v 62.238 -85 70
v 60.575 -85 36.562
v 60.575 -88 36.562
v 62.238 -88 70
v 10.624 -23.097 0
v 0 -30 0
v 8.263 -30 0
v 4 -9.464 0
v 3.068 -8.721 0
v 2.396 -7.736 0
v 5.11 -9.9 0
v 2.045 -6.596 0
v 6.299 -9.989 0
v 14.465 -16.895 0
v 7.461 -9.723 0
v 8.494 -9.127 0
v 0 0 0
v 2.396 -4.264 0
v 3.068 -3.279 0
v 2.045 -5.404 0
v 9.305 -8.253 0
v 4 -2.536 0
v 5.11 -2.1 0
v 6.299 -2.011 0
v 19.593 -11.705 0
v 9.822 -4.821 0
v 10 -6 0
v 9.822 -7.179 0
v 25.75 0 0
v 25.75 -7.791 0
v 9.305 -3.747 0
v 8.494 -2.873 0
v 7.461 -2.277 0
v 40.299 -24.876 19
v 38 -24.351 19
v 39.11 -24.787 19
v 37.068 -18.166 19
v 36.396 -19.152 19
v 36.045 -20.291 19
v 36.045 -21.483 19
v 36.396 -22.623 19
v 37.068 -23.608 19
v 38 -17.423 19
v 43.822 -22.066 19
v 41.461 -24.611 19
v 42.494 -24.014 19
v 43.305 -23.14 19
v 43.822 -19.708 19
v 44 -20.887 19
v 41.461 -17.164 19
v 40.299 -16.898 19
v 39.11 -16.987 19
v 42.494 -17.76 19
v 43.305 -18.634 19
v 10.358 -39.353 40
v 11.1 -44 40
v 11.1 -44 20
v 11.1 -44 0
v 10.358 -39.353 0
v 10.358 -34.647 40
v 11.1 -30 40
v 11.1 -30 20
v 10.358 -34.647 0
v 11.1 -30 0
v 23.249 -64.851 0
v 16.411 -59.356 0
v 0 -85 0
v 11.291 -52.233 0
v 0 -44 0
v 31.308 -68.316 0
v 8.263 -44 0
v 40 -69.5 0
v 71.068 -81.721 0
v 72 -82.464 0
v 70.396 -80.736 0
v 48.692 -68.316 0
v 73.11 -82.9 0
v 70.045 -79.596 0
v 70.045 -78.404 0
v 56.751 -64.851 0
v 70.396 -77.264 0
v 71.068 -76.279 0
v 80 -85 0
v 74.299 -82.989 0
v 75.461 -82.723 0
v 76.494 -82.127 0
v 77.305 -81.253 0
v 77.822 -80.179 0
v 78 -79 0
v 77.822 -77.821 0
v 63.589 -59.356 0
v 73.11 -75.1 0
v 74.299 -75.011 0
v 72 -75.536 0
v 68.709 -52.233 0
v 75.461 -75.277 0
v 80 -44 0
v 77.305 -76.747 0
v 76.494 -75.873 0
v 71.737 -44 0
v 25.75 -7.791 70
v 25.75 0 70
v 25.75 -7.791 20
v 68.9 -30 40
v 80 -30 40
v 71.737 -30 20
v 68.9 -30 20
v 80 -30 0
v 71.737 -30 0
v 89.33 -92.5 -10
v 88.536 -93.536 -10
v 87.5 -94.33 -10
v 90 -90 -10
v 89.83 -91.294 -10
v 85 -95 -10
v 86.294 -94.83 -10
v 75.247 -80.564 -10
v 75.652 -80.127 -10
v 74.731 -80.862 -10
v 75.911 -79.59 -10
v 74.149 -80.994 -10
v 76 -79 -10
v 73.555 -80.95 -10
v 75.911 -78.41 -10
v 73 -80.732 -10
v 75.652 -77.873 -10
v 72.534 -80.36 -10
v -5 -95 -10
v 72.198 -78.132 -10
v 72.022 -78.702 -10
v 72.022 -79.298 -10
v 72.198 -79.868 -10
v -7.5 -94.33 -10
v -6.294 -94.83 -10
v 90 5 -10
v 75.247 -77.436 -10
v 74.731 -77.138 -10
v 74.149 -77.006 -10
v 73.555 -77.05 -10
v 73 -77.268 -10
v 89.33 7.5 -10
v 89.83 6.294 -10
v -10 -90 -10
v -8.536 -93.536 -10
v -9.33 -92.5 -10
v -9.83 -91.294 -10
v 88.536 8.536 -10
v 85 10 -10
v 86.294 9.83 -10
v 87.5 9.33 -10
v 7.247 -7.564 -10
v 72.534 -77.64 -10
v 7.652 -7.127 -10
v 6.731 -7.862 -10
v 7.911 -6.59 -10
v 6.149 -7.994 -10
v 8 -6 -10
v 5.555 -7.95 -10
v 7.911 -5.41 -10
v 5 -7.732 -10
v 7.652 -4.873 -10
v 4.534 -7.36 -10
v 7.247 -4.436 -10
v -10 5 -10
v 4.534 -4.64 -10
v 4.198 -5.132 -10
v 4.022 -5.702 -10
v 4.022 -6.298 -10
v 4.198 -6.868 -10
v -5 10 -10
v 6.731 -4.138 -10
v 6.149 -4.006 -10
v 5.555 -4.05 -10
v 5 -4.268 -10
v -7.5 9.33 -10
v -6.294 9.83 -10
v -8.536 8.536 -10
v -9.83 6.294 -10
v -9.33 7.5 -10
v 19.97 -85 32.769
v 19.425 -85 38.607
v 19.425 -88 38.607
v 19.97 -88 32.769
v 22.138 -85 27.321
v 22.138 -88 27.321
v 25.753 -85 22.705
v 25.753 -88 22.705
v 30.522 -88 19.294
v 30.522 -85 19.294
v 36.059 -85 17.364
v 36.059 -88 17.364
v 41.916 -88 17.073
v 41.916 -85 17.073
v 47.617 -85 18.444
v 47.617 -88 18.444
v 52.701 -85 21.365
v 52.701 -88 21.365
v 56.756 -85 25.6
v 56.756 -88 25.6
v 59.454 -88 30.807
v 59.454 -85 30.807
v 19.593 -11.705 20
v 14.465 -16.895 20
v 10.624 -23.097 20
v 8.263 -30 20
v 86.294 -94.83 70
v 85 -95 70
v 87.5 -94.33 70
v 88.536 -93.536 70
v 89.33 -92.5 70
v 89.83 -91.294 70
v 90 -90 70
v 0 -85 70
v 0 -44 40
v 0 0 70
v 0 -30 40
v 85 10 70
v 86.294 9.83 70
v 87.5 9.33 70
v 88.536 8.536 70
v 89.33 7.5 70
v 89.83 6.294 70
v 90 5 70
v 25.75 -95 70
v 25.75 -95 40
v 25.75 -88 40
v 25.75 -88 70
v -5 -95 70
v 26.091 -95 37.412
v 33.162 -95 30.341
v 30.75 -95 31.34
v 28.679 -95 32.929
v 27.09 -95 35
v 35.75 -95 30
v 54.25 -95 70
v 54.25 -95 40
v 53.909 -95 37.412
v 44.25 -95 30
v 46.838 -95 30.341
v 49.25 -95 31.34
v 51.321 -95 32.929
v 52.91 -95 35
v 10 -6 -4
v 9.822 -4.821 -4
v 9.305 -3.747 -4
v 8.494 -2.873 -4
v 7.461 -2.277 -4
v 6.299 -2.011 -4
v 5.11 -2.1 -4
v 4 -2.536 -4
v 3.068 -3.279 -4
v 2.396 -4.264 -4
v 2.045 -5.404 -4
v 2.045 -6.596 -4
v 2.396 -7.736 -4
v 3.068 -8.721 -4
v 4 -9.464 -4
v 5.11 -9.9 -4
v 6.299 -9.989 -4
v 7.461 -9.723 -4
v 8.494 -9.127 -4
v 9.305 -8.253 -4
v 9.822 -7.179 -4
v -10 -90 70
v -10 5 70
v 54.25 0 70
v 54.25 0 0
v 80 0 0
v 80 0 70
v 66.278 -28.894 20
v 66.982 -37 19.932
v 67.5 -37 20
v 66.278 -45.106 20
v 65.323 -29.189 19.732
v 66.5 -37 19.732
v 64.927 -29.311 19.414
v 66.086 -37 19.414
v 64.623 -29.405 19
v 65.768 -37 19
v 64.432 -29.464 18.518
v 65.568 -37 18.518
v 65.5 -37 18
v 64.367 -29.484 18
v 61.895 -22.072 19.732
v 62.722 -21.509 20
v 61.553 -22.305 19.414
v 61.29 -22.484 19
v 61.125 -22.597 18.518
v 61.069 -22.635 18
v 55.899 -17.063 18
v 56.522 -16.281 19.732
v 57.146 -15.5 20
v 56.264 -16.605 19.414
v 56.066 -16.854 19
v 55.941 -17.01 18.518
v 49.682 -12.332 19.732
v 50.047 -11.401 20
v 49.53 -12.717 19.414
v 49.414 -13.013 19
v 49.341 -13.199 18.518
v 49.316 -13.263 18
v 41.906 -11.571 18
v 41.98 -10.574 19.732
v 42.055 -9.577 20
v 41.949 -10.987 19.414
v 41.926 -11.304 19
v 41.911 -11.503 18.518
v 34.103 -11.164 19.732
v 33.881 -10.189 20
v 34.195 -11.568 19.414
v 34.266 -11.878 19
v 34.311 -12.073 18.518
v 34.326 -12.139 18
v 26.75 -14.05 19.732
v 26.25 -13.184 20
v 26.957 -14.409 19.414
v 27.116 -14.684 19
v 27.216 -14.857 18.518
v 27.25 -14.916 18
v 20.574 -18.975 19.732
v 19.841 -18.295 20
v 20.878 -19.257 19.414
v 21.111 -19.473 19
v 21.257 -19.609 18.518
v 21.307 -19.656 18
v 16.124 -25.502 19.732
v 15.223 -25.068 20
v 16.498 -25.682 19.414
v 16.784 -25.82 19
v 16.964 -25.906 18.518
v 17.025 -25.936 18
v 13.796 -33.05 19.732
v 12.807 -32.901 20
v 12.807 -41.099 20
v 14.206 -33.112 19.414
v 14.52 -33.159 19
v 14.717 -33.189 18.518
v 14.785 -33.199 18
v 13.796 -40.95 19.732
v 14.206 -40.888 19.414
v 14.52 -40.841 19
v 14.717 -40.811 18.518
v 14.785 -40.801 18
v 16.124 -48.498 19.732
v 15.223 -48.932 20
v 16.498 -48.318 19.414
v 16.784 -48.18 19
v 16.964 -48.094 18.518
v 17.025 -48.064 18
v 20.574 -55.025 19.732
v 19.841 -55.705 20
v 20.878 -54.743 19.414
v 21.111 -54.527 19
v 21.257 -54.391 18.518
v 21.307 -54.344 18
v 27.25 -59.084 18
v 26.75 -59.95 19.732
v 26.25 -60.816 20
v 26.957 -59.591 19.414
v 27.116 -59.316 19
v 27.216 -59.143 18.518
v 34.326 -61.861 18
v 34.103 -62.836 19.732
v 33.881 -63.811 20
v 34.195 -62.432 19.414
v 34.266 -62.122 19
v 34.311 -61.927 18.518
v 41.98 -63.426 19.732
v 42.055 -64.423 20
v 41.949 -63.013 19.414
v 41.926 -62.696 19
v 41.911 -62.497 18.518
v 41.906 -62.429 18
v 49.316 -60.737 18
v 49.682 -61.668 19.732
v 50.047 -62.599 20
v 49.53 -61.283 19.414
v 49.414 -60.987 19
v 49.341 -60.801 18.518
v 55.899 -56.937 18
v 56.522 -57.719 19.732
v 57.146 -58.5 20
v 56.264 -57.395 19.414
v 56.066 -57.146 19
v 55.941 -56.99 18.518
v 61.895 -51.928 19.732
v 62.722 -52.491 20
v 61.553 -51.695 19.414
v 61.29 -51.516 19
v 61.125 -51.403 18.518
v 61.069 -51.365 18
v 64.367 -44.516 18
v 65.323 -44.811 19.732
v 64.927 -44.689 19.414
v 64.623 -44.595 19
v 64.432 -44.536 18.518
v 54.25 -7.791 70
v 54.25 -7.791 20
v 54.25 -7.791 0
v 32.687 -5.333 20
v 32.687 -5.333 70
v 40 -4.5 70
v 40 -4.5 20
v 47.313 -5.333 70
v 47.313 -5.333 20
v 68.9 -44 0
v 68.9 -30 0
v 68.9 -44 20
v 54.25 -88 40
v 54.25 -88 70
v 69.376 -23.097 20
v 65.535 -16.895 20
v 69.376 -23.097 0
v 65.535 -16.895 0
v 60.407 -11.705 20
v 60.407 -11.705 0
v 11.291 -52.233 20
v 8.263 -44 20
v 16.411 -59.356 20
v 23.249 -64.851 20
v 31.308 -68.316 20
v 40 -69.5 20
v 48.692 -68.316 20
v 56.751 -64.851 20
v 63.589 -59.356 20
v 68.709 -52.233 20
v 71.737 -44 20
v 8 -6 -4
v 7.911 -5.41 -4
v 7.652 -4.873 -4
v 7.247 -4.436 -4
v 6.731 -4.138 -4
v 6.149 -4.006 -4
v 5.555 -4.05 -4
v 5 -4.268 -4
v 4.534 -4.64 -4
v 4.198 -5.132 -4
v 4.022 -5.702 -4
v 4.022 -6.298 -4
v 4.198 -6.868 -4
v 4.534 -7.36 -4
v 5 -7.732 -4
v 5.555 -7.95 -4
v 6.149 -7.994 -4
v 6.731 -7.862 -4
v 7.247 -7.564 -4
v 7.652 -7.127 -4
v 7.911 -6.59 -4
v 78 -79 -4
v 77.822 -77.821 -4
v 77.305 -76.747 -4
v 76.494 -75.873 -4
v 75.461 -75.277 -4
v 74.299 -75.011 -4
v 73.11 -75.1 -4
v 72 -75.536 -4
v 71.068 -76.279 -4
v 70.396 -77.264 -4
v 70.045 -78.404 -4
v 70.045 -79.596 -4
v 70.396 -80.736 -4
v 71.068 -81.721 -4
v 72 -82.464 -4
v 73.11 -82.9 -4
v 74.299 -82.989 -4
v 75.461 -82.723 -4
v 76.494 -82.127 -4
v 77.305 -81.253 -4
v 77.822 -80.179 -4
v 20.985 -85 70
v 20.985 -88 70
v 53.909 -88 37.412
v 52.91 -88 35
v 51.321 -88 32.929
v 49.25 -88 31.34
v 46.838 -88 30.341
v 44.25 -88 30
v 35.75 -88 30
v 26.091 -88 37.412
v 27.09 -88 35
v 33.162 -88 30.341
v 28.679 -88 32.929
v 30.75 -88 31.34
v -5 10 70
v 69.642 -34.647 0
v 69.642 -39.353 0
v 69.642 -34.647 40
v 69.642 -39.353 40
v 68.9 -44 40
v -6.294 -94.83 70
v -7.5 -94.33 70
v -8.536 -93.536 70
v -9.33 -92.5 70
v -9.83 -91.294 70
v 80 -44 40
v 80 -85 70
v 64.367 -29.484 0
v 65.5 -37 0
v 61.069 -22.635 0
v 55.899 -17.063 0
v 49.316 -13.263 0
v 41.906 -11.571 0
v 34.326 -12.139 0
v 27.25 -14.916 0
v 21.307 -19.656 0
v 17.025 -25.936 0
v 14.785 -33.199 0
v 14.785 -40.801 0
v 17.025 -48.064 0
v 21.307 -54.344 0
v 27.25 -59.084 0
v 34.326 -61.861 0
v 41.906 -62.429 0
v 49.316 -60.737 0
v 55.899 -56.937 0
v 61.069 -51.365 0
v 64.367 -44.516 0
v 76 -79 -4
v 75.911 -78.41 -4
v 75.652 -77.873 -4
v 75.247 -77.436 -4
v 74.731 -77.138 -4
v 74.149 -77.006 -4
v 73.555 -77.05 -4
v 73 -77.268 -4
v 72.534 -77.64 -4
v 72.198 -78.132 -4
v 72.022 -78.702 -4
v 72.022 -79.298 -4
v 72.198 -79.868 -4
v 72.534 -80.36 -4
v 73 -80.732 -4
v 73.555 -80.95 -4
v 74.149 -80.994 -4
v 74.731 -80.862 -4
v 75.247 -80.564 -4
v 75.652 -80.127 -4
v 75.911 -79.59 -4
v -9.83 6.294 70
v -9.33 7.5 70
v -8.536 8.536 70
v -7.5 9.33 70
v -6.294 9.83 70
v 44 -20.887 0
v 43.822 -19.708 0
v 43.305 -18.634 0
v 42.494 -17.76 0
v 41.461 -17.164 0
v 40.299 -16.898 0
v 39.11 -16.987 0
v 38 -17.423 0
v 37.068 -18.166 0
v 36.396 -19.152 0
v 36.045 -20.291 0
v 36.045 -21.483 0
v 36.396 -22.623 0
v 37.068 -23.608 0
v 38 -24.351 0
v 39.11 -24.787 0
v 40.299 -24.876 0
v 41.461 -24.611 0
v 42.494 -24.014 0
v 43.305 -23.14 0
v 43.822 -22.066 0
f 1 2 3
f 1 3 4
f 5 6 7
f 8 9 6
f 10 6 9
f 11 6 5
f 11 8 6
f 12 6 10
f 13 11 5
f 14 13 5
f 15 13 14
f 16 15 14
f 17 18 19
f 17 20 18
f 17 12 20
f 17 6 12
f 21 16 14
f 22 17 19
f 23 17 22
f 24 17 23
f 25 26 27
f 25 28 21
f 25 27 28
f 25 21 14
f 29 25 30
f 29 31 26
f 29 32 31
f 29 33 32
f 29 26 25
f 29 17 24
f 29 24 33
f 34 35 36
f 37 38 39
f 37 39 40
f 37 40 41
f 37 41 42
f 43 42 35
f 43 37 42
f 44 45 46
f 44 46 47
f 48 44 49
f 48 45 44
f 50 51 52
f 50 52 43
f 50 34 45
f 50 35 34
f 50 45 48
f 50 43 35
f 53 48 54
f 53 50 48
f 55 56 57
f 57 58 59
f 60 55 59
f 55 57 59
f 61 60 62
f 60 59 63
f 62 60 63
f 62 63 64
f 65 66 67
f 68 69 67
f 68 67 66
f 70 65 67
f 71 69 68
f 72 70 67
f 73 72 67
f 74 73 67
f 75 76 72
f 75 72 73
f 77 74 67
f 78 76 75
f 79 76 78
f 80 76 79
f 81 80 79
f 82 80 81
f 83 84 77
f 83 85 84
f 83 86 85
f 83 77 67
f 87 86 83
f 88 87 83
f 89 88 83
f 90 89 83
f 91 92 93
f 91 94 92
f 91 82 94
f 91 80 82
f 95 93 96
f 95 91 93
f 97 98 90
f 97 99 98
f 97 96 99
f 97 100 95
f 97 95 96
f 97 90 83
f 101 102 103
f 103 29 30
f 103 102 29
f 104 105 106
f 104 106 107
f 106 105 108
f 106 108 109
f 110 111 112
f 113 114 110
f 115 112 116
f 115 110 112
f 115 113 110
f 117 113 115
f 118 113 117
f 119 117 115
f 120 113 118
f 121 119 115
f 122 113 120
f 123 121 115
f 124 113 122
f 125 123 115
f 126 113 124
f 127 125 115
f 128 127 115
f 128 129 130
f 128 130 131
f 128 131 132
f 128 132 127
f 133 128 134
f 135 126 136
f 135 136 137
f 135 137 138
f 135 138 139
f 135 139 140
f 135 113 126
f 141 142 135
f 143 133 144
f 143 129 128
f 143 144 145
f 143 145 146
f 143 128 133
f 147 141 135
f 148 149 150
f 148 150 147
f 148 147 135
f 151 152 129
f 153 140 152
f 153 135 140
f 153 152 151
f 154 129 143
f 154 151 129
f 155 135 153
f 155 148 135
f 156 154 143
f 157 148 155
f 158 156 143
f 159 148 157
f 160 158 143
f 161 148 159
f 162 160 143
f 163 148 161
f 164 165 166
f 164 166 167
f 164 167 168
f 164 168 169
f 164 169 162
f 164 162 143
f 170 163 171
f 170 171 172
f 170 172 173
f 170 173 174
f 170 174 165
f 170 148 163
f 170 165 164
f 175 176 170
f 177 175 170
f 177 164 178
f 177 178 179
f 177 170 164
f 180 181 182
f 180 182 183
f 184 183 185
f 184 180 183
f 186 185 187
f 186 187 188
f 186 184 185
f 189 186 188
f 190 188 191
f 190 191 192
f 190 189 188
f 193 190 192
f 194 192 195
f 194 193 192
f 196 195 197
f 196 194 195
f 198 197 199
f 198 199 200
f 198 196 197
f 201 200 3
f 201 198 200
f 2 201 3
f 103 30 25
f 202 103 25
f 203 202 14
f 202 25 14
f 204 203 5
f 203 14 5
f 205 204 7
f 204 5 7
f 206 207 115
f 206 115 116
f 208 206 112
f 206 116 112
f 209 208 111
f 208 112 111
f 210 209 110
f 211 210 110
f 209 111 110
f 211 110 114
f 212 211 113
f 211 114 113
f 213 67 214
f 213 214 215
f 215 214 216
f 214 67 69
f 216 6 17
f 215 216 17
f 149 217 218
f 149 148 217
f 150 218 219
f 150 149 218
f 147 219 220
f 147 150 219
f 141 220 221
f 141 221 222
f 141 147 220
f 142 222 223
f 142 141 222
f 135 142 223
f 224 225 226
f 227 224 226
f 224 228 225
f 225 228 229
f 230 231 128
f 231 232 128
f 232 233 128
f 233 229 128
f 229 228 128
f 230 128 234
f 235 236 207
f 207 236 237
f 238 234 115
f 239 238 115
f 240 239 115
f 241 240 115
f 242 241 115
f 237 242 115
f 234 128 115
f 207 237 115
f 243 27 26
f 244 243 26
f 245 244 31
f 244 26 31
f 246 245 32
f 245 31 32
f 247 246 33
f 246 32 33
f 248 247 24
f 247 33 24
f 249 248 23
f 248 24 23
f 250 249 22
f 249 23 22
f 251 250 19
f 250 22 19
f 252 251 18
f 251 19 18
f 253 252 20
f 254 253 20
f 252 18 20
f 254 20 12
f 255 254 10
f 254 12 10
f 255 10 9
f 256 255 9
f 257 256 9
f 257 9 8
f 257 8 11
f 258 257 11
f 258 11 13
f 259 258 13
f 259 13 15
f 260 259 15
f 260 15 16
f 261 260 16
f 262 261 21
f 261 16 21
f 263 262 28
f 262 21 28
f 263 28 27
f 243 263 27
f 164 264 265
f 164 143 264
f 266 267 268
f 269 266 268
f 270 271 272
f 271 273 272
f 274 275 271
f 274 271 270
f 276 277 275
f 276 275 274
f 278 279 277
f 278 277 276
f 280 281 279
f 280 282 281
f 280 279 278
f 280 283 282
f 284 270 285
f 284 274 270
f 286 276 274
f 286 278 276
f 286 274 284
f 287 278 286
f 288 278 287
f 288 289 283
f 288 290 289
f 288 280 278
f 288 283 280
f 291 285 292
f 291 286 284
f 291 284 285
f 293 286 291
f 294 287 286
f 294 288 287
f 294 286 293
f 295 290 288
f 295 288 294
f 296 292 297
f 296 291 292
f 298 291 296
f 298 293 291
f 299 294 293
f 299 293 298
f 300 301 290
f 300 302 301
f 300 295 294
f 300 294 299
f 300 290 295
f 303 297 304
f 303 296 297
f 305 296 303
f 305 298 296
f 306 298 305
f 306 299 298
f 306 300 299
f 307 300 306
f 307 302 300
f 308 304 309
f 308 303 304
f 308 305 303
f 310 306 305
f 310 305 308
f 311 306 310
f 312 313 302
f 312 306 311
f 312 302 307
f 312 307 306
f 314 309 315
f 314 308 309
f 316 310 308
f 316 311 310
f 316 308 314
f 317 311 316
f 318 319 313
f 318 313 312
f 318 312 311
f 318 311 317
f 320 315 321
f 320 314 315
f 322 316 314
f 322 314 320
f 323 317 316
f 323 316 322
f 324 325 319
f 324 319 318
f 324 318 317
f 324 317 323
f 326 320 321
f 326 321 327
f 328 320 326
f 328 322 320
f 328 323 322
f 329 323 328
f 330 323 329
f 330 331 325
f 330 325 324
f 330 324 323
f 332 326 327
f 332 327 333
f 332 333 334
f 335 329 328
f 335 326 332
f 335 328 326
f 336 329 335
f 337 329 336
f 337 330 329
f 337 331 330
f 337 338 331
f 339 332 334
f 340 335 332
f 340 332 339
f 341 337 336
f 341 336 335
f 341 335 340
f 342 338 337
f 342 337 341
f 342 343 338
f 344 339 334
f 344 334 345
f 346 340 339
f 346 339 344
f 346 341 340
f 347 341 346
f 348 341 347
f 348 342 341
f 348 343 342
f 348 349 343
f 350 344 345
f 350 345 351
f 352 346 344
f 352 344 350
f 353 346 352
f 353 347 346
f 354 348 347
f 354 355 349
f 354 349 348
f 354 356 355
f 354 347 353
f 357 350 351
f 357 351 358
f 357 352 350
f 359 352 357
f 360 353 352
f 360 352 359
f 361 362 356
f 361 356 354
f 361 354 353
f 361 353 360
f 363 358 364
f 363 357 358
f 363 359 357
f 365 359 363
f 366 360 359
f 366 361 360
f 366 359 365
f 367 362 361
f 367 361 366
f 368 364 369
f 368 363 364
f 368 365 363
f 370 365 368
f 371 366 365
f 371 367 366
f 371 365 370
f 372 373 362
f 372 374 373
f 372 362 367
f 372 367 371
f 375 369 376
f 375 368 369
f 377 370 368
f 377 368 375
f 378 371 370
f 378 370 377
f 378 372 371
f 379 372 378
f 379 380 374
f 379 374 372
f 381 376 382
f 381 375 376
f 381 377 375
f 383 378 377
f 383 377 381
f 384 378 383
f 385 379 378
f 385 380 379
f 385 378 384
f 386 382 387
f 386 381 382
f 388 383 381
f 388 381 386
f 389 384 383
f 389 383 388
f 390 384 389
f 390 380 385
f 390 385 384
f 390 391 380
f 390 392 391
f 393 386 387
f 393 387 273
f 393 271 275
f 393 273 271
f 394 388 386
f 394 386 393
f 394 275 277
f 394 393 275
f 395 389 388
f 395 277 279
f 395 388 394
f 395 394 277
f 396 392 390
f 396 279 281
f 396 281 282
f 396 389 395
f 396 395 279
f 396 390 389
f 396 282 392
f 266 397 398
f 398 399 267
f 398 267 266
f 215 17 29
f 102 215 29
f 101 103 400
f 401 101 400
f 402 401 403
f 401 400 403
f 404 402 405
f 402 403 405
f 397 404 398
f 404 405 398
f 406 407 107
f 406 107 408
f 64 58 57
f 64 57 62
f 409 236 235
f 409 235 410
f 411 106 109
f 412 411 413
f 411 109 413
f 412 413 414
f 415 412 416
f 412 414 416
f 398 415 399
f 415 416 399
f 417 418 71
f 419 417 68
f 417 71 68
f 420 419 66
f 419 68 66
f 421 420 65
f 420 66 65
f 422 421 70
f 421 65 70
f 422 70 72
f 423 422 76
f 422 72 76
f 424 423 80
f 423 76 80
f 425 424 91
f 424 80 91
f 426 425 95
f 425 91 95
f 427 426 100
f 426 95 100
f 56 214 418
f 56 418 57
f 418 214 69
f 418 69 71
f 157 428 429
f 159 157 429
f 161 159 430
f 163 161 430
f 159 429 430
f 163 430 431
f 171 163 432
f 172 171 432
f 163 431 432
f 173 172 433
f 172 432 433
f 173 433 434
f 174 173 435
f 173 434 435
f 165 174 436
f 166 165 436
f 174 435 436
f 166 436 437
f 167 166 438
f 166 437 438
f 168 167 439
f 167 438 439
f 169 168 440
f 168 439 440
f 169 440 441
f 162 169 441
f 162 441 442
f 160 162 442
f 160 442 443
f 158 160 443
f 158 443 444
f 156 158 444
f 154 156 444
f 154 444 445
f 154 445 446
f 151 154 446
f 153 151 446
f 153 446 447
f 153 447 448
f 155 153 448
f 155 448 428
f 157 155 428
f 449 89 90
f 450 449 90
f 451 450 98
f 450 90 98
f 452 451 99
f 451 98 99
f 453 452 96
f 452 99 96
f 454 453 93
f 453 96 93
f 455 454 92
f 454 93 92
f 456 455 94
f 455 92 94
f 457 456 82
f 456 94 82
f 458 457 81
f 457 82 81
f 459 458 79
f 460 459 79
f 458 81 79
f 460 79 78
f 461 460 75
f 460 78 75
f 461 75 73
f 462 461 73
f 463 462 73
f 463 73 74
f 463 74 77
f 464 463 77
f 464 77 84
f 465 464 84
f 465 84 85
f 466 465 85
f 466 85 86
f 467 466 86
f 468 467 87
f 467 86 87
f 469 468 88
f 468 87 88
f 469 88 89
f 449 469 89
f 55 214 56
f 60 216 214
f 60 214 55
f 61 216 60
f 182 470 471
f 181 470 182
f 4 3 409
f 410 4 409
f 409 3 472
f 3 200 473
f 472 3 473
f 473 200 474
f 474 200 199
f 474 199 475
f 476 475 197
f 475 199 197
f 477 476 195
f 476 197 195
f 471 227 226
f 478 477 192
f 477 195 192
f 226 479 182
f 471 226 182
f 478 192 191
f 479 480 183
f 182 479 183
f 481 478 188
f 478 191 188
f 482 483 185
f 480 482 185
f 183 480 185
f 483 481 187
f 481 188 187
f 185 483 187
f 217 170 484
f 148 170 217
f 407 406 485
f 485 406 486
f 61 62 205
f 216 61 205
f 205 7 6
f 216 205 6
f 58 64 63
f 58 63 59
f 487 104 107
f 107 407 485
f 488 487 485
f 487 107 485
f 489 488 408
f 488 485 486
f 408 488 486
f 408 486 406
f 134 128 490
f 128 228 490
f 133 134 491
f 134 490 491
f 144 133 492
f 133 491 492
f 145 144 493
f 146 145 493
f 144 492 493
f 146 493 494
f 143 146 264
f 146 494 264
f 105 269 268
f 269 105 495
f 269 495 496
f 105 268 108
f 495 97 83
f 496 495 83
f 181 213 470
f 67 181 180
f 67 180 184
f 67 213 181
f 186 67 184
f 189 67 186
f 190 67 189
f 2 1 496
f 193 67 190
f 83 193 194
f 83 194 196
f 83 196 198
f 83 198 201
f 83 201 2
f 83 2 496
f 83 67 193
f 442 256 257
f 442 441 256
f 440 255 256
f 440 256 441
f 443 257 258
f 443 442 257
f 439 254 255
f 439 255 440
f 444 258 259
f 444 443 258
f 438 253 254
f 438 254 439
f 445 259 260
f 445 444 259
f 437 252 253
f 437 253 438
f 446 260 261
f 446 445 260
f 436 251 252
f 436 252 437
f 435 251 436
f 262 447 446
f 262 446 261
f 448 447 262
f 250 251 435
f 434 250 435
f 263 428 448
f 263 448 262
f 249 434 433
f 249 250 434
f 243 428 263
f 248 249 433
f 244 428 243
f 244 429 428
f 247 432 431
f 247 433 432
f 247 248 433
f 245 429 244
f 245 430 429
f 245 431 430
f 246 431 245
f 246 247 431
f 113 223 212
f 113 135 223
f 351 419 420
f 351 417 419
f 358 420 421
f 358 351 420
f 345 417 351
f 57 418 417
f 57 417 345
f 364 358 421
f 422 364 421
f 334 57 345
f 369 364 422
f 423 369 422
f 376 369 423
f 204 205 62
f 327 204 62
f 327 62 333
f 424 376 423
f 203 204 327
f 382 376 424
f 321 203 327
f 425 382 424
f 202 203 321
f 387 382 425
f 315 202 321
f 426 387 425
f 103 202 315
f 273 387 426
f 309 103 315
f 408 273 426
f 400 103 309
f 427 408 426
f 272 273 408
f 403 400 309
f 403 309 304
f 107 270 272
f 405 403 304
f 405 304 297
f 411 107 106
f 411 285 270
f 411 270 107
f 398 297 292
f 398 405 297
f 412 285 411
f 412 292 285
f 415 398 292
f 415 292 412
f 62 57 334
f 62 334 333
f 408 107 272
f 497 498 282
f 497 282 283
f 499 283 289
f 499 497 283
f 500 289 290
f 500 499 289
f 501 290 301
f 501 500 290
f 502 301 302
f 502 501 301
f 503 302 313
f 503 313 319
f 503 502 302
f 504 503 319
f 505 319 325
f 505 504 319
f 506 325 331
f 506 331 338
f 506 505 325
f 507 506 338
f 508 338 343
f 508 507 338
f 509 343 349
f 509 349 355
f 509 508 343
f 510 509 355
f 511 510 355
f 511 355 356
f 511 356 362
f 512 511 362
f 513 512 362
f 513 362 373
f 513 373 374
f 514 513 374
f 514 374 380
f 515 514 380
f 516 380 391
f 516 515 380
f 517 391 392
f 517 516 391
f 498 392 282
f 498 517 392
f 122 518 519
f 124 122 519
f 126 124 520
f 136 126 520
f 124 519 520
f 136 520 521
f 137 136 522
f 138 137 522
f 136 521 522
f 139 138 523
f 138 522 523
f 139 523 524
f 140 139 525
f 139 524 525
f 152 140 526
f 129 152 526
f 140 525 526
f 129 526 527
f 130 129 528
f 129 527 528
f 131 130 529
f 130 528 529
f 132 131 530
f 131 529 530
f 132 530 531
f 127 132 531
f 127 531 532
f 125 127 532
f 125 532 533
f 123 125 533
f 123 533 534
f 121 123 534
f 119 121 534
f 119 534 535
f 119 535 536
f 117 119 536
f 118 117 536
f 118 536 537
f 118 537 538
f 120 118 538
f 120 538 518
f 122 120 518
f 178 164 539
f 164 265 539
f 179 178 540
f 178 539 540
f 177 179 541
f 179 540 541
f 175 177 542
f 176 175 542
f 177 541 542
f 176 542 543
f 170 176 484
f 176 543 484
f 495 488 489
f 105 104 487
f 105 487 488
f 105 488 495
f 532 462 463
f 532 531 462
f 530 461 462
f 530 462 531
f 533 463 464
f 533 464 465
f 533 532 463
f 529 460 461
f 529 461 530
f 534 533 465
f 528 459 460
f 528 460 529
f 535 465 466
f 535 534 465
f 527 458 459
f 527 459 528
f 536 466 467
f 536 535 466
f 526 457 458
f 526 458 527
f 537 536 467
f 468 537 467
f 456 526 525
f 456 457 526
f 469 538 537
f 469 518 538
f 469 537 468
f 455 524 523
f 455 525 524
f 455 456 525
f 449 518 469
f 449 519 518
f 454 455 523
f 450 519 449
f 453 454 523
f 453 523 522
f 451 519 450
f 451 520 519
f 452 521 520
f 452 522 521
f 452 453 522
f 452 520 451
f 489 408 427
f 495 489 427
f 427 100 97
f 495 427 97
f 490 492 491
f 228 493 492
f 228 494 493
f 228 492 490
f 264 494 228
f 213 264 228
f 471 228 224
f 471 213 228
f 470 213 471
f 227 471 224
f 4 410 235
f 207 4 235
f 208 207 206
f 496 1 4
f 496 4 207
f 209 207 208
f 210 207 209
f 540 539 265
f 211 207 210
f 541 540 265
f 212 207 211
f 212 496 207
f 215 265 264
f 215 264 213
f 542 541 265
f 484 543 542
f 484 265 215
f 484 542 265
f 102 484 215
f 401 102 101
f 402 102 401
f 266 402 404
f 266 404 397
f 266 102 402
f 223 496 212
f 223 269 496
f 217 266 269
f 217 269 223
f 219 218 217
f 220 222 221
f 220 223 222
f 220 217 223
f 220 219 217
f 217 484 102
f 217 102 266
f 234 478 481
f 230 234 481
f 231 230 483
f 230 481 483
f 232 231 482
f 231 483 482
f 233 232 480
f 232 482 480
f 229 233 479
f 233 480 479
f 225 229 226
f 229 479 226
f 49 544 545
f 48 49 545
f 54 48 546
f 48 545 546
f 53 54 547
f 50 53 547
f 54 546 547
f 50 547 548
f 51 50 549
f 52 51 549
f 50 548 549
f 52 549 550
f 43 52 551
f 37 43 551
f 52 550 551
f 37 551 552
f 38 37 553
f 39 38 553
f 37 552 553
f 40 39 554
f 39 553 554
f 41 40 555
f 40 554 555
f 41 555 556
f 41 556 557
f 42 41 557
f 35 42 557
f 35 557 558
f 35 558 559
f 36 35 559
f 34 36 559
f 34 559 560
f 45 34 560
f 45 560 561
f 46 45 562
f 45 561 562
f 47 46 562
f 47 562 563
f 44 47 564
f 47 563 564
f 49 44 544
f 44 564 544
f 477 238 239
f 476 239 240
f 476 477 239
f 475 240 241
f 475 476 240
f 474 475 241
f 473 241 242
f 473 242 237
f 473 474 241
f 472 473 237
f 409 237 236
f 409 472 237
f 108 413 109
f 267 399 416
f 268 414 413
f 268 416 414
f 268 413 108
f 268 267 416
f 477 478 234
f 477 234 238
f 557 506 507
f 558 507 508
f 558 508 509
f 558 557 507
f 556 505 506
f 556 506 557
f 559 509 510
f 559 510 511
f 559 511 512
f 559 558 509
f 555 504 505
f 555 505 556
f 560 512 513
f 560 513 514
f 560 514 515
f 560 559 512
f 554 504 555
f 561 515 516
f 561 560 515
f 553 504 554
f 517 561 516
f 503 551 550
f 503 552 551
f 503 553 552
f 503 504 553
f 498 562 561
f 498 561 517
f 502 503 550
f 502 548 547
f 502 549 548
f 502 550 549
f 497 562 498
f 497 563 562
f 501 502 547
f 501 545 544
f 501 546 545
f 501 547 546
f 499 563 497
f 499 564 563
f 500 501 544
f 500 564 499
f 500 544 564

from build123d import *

# Parameters (mm, degrees)
SKETCH1_W            = 100
SKETCH1_H            = 105
BOSS_EXTRUDE1_DEPTH  = 10
SKETCH1_3_W          = 100
SKETCH1_3_H          = 105
SKETCH1_3_W_2        = 80
SKETCH1_3_H_2        = 85
BOSS_EXTRUDE2_DEPTH  = 70
SKETCH1_6_W          = 28.5
SKETCH1_6_H          = 10
CUT_EXTRUDE1_DEPTH   = 80
SKETCH1_7_W          = 28.5
SKETCH1_7_H          = 10
BOSS_EXTRUDE4_DEPTH  = 30
SKETCH1_8_R          = 2
CUT_EXTRUDE2_DEPTH   = 30
SKETCH1_9_R          = 4
CUT_EXTRUDE3_DEPTH   = 4
SKETCH1_11_R         = 32.5
SKETCH1_11_R_2       = 25.5
BOSS_EXTRUDE6_DEPTH  = 20
FILLET1_R            = 10
SKETCH1_12_R         = 4
BOSS_EXTRUDE7_DEPTH  = 19
BOSS_EXTRUDE13_DEPTH = 70
BOSS_EXTRUDE17_DEPTH = 40
CUT_EXTRUDE4_DEPTH   = 40
CUT_EXTRUDE5_DEPTH   = 3
FILLET2_R            = 5
FILLET3_R            = 2


with BuildPart() as part:
    # Sketch1 → Boss-Extrude1 (new body)
    with BuildSketch(Plane.XY):
        with Locations((40, -42.5)):
            Rectangle(SKETCH1_W, SKETCH1_H)
    extrude(amount=-BOSS_EXTRUDE1_DEPTH)

    # Sketch1<3> → Boss-Extrude2 (add)
    with BuildSketch(Plane.XY):
        with Locations((40, -42.5)):
            Rectangle(SKETCH1_3_W, SKETCH1_3_H)
        with Locations((40, -42.5)):
            Rectangle(SKETCH1_3_W_2, SKETCH1_3_H_2, mode=Mode.SUBTRACT)
    extrude(amount=BOSS_EXTRUDE2_DEPTH)

    # Sketch1<6> → Cut-Extrude1 (cut)
    with BuildSketch(Plane.XY):
        with Locations((40, -90)):
            Rectangle(SKETCH1_6_W, SKETCH1_6_H)
    extrude(amount=CUT_EXTRUDE1_DEPTH, mode=Mode.SUBTRACT)

    # Sketch1<7> → Boss-Extrude4 (add)
    with BuildSketch(Plane.XY):
        with Locations((40, -90)):
            Rectangle(SKETCH1_7_W, SKETCH1_7_H)
    extrude(amount=BOSS_EXTRUDE4_DEPTH)

    # Sketch1<8> → Cut-Extrude2 (cut)
    with BuildSketch(Plane.XY):
        with Locations((6, -6)):
            Circle(SKETCH1_8_R)
        with Locations((74, -79)):
            Circle(SKETCH1_8_R)
    extrude(amount=-CUT_EXTRUDE2_DEPTH, mode=Mode.SUBTRACT)

    # Sketch1<9> → Cut-Extrude3 (cut)
    with BuildSketch(Plane.XY):
        with Locations((6, -6)):
            Circle(SKETCH1_9_R)
        with Locations((74, -79)):
            Circle(SKETCH1_9_R)
    extrude(amount=-CUT_EXTRUDE3_DEPTH, mode=Mode.SUBTRACT)

    # Sketch1<11> → Boss-Extrude6 (add)
    with BuildSketch(Plane.XY):
        with Locations((40, -37)):
            Circle(SKETCH1_11_R)
        with Locations((40, -37)):
            Circle(SKETCH1_11_R_2, mode=Mode.SUBTRACT)
    extrude(amount=BOSS_EXTRUDE6_DEPTH)

    # Fillet1
    fillet1_edges = [part.edges().sort_by_distance(p)[0] for p in [
        (25.75, -90, 30),
        (54.25, -90, 30),
    ]]
    fillet(fillet1_edges, radius=FILLET1_R)

    # Sketch1<12> → Boss-Extrude7 (add)
    with BuildSketch(Plane.XY):
        with Locations((40, -20.887152182)):
            Circle(SKETCH1_12_R)
    extrude(amount=BOSS_EXTRUDE7_DEPTH)

    # Sketch1<18> → Boss-Extrude13 (add)
    with BuildSketch(Plane.XY):
        with BuildLine():
            Line((54.25, -7.790626504), (54.25, 0))
            Line((54.25, 0), (25.75, 0))
            Line((25.75, 0), (25.75, -7.790626504))
            ThreePointArc((25.75, -7.790626504), (40, -4.5), (54.25, -7.790626504))
        make_face()
    extrude(amount=BOSS_EXTRUDE13_DEPTH)

    # Sketch1<24> → Boss-Extrude17 (add)
    with BuildSketch(Plane.XY):
        with BuildLine():
            Line((80, -44), (80, -30))
            Line((80, -30), (68.9, -30))
            ThreePointArc((68.9, -30), (69.735668817, -37), (68.9, -44))
            Line((68.9, -44), (80, -44))
        make_face()
        with BuildLine():
            Line((0, -44), (11.1, -44))
            ThreePointArc((11.1, -44), (10.264331183, -37), (11.1, -30))
            Line((11.1, -30), (0, -30))
            Line((0, -30), (0, -44))
        make_face()
    extrude(amount=BOSS_EXTRUDE17_DEPTH)

    # Sketch1<25> → Cut-Extrude4 (cut)
    with BuildSketch(Plane.XY):
        with BuildLine():
            ThreePointArc((68.9, -44), (69.735668817, -37), (68.9, -30))
            Line((68.9, -30), (68.9, -44))
        make_face()
        with BuildLine():
            Line((11.1, -44), (11.1, -30))
            ThreePointArc((11.1, -30), (10.264331183, -37), (11.1, -44))
        make_face()
    extrude(amount=CUT_EXTRUDE4_DEPTH, mode=Mode.SUBTRACT)

    # Sketch2 → Cut-Extrude5 (cut)
    with BuildSketch(Plane(origin=(0, -85, 0), x_dir=(1, 0, 0), z_dir=(0, 1, 0))):
        with BuildLine():
            Line((60.575284083, -36.561798125), (62.82181371, -81.752405975))
            ThreePointArc((62.82181371, -81.752405975), (43.269374583, -103.350535014), (21.671245545, -83.798095887))
            Line((21.671245545, -83.798095887), (19.424715917, -38.607488037))
            ThreePointArc((19.424715917, -38.607488037), (38.977155044, -17.009358998), (60.575284083, -36.561798125))
        make_face()
    extrude(amount=-CUT_EXTRUDE5_DEPTH, mode=Mode.SUBTRACT)

    # Fillet2
    fillet2_edges = [part.edges().sort_by_distance(p)[0] for p in [
        (90, -95, 30),
        (90, 10, 30),
        (-10, 10, 30),
        (-10, -95, 30),
    ]]
    fillet(fillet2_edges, radius=FILLET2_R)

    # Fillet3
    fillet3_edges = [part.edges().sort_by_distance(p)[0] for p in [
        (14.5, -37, 20),
    ]]
    fillet(fillet3_edges, radius=FILLET3_R)


solid = part.part
